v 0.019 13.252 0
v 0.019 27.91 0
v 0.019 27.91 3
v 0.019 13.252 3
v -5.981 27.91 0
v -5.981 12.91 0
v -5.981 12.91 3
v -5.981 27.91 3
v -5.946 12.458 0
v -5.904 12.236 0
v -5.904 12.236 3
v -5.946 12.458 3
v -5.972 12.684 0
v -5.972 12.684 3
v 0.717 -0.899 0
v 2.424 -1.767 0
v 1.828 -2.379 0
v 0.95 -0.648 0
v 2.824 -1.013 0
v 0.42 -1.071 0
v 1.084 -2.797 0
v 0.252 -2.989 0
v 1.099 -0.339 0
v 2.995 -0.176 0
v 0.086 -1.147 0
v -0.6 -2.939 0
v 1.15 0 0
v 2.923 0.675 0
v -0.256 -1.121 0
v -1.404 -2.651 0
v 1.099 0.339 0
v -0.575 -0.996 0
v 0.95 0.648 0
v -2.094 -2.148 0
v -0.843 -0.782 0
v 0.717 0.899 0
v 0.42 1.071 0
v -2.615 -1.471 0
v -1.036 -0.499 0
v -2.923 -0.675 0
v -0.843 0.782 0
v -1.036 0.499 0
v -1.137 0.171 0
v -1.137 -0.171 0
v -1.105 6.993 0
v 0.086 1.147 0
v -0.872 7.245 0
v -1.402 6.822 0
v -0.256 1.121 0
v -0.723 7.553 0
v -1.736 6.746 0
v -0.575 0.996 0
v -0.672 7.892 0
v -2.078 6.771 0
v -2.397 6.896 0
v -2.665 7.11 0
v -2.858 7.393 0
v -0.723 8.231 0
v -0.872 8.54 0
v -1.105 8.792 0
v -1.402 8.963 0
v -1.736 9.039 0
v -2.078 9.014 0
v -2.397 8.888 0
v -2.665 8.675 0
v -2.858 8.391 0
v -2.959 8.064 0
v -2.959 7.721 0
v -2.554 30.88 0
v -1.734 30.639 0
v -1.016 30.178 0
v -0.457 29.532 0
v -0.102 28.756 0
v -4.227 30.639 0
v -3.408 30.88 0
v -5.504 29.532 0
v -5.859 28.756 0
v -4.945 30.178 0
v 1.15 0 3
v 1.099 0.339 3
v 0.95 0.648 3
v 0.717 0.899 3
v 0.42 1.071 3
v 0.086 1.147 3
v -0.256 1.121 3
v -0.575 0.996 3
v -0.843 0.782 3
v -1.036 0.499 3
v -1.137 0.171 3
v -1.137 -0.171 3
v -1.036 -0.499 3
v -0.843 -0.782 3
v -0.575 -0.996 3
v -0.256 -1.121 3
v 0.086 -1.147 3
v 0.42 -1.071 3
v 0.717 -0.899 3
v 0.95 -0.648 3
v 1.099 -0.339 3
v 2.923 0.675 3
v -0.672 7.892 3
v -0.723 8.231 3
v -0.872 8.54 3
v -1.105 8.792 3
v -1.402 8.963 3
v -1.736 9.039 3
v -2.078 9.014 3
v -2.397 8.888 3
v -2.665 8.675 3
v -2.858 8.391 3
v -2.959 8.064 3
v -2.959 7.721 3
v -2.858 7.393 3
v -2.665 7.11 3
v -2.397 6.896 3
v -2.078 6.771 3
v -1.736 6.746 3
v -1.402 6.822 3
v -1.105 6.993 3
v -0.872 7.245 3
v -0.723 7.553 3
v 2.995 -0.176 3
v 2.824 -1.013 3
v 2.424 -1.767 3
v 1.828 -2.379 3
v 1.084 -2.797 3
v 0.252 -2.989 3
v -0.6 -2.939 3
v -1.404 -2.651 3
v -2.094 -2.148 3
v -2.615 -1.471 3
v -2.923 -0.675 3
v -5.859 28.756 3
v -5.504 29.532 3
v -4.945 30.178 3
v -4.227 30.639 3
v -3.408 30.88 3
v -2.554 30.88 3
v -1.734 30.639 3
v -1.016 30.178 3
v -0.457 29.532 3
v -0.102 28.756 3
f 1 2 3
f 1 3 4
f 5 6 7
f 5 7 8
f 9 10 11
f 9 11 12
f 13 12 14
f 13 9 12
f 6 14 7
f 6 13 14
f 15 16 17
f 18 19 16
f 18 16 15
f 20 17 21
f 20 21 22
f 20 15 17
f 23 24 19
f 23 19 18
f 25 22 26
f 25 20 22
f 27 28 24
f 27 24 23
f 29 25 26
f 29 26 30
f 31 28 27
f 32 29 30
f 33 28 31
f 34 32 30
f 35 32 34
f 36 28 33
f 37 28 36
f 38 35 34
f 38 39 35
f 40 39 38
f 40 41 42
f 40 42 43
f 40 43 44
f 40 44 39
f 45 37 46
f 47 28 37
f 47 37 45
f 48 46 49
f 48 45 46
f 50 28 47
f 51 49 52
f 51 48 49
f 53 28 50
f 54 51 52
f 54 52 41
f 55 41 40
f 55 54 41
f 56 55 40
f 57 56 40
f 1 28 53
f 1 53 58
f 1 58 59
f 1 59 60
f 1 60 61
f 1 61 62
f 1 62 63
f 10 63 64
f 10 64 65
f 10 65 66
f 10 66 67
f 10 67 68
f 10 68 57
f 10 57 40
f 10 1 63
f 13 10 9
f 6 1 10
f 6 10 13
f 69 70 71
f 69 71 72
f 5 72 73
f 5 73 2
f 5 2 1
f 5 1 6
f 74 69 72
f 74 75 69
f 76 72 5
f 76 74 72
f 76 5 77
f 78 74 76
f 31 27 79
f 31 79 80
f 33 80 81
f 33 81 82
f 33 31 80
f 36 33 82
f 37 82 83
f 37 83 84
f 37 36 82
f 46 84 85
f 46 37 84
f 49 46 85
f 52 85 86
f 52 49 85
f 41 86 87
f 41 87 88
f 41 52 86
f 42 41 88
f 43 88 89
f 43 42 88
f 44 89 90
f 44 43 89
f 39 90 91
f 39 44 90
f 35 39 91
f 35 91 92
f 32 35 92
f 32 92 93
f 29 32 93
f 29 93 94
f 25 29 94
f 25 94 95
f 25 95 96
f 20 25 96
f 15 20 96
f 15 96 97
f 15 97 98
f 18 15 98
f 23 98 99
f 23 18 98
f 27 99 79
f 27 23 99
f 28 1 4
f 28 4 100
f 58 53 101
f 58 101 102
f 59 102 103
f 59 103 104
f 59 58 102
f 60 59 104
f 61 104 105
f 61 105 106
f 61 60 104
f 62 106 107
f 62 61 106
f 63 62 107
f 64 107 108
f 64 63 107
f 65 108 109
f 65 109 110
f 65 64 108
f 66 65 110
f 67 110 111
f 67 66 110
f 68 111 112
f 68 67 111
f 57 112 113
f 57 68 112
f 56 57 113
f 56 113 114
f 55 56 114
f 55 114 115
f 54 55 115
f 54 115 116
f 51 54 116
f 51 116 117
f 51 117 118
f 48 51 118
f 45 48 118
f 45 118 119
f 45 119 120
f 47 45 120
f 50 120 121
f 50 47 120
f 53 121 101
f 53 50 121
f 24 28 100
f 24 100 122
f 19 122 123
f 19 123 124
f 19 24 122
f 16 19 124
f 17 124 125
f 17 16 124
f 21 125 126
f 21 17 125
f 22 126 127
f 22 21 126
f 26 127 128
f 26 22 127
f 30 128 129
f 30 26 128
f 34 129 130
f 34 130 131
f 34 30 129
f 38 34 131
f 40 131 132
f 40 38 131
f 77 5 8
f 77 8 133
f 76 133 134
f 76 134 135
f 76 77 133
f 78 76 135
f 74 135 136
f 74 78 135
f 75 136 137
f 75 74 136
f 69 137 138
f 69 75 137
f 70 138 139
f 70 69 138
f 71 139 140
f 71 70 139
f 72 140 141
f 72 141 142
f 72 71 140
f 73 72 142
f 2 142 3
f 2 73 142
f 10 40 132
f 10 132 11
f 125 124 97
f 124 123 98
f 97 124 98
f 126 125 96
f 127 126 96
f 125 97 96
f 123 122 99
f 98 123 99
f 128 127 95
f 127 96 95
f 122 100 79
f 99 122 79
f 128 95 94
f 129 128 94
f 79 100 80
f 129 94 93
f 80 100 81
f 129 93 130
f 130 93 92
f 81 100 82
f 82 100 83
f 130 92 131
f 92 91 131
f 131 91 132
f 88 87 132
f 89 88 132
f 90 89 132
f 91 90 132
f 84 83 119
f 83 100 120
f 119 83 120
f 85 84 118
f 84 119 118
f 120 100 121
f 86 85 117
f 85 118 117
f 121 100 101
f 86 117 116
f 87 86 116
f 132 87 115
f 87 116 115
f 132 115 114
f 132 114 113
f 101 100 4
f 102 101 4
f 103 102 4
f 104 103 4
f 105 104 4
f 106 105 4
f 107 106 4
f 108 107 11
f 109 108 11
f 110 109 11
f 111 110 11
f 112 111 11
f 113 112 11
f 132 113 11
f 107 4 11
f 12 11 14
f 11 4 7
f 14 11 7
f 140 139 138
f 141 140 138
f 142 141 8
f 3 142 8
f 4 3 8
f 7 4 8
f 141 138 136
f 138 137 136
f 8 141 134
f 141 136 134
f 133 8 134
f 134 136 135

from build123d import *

# Parameters (mm, degrees)
SKETCH1_R           = 1.15
BOSS_EXTRUDE1_DEPTH = 3


with BuildPart() as part:
    # Sketch1 → Boss-Extrude1 (new body)
    with BuildSketch(Plane.XY):
        with BuildLine():
            Line((-2.923110194, -0.674853163), (-5.903711664, 12.235550195))
            ThreePointArc((-5.903711664, 12.235550195), (-5.961317037, 12.570793717), (-5.98060147, 12.910403358))
            Line((-5.98060147, 12.910403358), (-5.98060147, 27.910403358))
            ThreePointArc((-5.98060147, 27.910403358), (-2.98060147, 30.910403358), (0.01939853, 27.910403358))
            Line((0.01939853, 27.910403358), (0.01939853, 13.252210183))
            Line((0.01939853, 13.252210183), (2.923110194, 0.674853163))
            ThreePointArc((2.923110194, 0.674853163), (0.674853163, -2.923110194), (-2.923110194, -0.674853163))
        make_face()
        Circle(SKETCH1_R, mode=Mode.SUBTRACT)
        with Locations((-1.82210354, 7.892397525)):
            Circle(SKETCH1_R, mode=Mode.SUBTRACT)
    extrude(amount=BOSS_EXTRUDE1_DEPTH)


solid = part.part
